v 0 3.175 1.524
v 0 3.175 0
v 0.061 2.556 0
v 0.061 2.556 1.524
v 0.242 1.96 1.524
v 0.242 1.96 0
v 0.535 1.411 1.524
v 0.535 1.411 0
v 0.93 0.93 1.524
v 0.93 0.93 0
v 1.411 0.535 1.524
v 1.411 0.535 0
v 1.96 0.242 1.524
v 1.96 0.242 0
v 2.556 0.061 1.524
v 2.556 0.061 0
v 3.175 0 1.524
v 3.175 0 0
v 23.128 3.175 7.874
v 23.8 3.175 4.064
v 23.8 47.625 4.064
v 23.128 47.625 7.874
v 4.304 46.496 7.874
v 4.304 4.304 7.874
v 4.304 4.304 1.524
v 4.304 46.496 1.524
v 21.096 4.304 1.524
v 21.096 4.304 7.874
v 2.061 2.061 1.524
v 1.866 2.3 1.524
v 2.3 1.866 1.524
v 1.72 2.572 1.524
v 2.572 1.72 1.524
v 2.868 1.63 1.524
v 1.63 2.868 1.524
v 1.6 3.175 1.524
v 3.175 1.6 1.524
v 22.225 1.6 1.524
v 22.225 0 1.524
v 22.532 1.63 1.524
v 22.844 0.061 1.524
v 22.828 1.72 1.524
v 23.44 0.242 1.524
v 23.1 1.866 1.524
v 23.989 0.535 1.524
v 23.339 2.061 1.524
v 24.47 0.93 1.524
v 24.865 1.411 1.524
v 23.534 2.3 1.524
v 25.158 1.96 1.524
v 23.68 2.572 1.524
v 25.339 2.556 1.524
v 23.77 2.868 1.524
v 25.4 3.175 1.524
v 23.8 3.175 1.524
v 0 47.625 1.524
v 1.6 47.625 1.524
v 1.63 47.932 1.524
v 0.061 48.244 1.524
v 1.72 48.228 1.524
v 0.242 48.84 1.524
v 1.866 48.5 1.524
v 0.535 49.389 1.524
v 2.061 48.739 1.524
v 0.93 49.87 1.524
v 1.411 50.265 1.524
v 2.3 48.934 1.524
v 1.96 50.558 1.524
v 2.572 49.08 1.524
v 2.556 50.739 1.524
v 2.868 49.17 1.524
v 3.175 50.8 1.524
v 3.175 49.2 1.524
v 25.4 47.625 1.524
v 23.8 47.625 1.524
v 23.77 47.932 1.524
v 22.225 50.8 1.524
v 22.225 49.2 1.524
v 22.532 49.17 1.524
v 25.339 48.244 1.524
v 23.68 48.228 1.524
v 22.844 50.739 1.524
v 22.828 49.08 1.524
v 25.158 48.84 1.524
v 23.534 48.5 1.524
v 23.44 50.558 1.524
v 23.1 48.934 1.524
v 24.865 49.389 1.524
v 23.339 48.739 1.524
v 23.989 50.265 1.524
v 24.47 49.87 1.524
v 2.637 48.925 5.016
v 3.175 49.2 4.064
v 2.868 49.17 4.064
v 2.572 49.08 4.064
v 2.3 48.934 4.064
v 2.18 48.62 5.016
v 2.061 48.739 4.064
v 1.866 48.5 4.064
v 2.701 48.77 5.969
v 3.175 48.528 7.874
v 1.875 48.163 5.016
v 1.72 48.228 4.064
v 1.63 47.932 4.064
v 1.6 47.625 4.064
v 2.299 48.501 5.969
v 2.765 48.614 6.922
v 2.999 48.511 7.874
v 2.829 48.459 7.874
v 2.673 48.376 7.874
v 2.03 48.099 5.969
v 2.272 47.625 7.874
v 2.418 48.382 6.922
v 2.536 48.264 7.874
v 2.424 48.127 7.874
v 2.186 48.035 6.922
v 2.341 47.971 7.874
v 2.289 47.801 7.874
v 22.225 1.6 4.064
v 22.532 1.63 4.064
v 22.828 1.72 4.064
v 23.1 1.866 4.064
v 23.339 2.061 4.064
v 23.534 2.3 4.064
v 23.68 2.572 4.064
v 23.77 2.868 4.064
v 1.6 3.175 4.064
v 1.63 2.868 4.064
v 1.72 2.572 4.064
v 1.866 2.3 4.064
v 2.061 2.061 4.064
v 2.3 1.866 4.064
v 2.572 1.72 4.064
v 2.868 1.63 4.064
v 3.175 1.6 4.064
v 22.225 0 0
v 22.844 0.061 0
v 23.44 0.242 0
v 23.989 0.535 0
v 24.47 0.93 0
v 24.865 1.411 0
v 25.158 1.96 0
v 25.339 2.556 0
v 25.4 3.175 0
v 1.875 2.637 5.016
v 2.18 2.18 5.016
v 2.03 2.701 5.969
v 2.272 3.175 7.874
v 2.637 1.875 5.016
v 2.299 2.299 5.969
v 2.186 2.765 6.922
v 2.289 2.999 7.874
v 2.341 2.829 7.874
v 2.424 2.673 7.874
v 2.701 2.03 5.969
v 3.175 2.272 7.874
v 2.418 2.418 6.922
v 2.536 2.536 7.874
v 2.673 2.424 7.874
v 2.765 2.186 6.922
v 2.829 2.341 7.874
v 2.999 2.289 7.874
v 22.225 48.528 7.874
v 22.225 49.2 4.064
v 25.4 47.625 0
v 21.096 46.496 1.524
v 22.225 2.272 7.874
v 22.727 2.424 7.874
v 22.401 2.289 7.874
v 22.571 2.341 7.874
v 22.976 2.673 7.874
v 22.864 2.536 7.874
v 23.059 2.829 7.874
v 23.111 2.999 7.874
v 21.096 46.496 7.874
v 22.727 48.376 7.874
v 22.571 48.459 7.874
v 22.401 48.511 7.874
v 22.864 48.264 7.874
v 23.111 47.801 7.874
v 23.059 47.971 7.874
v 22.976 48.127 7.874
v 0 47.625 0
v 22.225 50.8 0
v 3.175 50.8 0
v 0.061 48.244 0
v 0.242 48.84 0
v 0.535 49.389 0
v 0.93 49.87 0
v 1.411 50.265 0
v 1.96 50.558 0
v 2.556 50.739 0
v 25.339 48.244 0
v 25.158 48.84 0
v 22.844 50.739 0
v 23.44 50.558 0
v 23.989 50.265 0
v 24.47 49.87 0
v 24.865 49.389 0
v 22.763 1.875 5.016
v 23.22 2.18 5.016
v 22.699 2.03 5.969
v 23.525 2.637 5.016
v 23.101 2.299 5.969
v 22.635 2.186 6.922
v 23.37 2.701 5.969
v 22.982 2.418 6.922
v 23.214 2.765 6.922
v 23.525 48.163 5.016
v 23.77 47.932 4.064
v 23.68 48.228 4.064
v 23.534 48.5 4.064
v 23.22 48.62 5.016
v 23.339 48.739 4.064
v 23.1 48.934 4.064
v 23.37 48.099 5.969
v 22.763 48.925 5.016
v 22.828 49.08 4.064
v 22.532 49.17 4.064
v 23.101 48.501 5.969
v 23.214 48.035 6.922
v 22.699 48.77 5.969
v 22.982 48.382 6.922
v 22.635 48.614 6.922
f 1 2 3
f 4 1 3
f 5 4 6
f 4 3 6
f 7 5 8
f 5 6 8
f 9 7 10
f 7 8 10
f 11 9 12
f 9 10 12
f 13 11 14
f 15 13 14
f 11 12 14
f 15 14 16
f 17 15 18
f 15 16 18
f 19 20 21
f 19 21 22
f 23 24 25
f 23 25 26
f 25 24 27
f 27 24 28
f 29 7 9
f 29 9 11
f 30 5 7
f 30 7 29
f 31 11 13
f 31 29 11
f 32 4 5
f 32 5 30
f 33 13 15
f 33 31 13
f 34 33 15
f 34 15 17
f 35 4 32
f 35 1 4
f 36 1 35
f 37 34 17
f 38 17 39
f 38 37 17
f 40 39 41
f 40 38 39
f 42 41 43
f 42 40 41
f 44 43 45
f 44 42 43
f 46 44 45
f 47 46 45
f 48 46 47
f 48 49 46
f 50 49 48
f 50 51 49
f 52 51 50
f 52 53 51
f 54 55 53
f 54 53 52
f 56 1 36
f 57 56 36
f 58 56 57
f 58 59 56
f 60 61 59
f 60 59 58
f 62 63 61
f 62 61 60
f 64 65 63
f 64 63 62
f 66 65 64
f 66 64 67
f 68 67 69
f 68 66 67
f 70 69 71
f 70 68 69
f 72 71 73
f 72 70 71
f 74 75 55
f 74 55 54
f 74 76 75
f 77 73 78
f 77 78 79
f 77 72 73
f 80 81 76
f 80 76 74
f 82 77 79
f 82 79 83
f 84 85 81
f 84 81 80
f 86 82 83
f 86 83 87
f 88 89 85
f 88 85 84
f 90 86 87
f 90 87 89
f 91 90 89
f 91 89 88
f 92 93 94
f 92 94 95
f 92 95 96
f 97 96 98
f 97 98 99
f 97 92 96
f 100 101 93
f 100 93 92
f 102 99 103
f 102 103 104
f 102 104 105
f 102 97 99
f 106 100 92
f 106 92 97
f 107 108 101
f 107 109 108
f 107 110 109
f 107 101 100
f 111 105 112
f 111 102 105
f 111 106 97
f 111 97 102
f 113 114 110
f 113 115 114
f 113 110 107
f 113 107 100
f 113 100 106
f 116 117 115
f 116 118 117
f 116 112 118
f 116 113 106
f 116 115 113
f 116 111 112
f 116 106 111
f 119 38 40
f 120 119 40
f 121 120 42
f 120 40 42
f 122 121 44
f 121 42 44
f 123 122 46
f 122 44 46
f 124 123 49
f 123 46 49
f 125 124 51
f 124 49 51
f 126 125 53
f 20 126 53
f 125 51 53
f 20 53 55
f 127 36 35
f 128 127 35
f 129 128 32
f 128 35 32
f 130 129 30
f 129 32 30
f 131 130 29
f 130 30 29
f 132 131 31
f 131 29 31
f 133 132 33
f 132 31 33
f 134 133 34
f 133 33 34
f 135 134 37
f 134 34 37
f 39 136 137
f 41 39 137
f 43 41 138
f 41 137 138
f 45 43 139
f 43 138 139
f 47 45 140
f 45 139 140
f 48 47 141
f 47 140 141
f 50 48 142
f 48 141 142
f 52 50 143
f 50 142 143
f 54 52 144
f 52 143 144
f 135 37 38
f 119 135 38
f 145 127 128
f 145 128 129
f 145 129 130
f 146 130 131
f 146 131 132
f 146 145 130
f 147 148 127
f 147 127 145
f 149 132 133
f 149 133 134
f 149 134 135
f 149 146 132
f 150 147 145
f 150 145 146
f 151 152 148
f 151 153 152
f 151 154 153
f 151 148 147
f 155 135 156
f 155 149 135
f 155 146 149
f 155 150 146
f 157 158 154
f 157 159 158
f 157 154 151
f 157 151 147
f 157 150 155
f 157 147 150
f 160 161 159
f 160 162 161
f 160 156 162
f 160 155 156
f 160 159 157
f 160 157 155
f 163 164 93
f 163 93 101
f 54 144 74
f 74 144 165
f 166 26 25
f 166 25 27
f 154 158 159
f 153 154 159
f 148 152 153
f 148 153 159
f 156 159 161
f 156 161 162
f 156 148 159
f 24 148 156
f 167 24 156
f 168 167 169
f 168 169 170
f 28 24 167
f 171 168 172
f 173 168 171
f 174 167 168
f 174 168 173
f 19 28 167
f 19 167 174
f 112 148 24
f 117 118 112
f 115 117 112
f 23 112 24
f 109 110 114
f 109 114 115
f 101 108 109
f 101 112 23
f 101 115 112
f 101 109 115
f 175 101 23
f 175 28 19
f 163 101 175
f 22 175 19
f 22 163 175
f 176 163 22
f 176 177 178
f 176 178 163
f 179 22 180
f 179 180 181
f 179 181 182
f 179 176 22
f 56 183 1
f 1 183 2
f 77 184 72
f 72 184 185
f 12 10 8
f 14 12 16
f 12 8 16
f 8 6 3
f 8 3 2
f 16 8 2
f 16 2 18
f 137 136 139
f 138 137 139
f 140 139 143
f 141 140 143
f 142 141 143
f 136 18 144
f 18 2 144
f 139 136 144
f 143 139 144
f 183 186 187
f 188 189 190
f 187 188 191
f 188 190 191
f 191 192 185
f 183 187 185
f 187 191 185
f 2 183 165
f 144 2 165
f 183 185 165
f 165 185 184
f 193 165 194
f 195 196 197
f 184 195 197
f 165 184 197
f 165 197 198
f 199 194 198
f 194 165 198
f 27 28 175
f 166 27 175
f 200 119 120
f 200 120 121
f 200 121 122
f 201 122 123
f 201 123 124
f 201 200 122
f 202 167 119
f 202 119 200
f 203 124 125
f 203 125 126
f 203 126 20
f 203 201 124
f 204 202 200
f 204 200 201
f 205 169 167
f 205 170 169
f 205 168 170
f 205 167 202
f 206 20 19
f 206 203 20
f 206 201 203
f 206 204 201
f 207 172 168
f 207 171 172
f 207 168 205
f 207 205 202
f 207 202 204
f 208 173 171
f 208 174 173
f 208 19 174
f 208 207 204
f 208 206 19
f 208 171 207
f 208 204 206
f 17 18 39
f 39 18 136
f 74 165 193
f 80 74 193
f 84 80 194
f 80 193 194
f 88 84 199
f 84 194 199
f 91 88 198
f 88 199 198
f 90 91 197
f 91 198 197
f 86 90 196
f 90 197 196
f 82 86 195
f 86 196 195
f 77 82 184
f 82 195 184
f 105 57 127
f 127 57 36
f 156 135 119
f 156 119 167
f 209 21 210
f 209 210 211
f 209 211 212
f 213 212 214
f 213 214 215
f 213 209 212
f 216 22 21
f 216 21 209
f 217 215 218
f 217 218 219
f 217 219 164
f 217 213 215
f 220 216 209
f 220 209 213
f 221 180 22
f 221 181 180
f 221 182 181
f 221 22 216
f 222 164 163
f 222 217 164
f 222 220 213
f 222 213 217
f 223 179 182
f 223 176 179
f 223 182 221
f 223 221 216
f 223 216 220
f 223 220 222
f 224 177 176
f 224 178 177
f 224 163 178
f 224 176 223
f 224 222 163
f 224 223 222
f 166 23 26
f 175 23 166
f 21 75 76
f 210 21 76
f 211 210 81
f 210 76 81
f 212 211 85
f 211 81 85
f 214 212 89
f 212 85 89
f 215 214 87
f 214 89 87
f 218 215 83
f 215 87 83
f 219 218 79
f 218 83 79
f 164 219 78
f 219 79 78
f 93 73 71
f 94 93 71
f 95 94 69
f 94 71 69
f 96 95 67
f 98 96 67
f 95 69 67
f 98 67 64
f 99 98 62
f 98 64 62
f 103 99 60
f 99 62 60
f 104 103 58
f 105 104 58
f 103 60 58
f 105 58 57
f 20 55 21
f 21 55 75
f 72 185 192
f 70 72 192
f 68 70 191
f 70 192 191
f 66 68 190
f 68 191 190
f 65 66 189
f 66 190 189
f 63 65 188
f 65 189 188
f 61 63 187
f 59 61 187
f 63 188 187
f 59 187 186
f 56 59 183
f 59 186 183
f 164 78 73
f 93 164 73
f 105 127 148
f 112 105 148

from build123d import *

# Parameters (mm, degrees)
F1_DEPTH = 1.524
F3_DEPTH = 2.54
F4_DEPTH = 3.81
F4_TAPER = 10
F5_W     = 16.791988407
F5_H     = 42.191988407
F6_DEPTH = 6.35


with BuildPart() as f1:
    # F0 (on Top) → F1 (new body)
    with BuildSketch(Plane.XY):
        with BuildLine():
            ThreePointArc((0, 3.175), (0.9299359697, 0.9299359697), (3.175, 0))
            Line((3.175, 0), (22.225, 0))
            ThreePointArc((22.225, 0), (24.4700640303, 0.9299359697), (25.4, 3.175))
            Line((25.4, 3.175), (25.4, 47.625))
            ThreePointArc((25.4, 47.625), (24.4700640303, 49.8700640303), (22.225, 50.8))
            Line((22.225, 50.8), (3.175, 50.8))
            ThreePointArc((3.175, 50.8), (0.9299359697, 49.8700640303), (0, 47.625))
            Line((0, 47.625), (0, 3.175))
        make_face()
    extrude(amount=F1_DEPTH)

    # F2 (on face) → F3 (join)
    with BuildSketch(Plane.XY.offset(1.524)):
        with BuildLine():
            Line((23.7998, 3.175), (23.7998, 47.625))
            ThreePointArc((23.7998, 47.625), (23.338551759, 48.738551759), (22.225, 49.1998))
            Line((22.225, 49.1998), (3.175, 49.1998))
            ThreePointArc((3.175, 49.1998), (2.061448241, 48.738551759), (1.6002, 47.625))
            Line((1.6002, 47.625), (1.6002, 3.175))
            ThreePointArc((1.6002, 3.175), (2.061448241, 2.061448241), (3.175, 1.6002))
            Line((3.175, 1.6002), (22.225, 1.6002))
            ThreePointArc((22.225, 1.6002), (23.338551759, 2.061448241), (23.7998, 3.175))
        make_face()
    extrude(amount=F3_DEPTH)

    # F3_face (on face) → F4 (join)
    with BuildSketch(Plane(origin=(12.7, 25.4, 4.064), x_dir=(1, 0, 0), z_dir=(0, 0, 1))):
        with BuildLine():
            ThreePointArc((9.525, -23.7998), (10.638551759, -23.338551759), (11.0998, -22.225))
            Line((11.0998, -22.225), (11.0998, 22.225))
            ThreePointArc((11.0998, 22.225), (10.638551759, 23.338551759), (9.525, 23.7998))
            Line((9.525, 23.7998), (-9.525, 23.7998))
            ThreePointArc((-9.525, 23.7998), (-10.638551759, 23.338551759), (-11.0998, 22.225))
            Line((-11.0998, 22.225), (-11.0998, -22.225))
            ThreePointArc((-11.0998, -22.225), (-10.638551759, -23.338551759), (-9.525, -23.7998))
            Line((-9.525, -23.7998), (9.525, -23.7998))
        make_face()
    extrude(amount=F4_DEPTH, taper=F4_TAPER)

    # F5 (on face) → F6 (cut)
    with BuildSketch(Plane.XY.offset(7.874)):
        with Locations((12.7, 25.4)):
            Rectangle(F5_W, F5_H)
    extrude(amount=-F6_DEPTH, mode=Mode.SUBTRACT)


solid = f1.part
